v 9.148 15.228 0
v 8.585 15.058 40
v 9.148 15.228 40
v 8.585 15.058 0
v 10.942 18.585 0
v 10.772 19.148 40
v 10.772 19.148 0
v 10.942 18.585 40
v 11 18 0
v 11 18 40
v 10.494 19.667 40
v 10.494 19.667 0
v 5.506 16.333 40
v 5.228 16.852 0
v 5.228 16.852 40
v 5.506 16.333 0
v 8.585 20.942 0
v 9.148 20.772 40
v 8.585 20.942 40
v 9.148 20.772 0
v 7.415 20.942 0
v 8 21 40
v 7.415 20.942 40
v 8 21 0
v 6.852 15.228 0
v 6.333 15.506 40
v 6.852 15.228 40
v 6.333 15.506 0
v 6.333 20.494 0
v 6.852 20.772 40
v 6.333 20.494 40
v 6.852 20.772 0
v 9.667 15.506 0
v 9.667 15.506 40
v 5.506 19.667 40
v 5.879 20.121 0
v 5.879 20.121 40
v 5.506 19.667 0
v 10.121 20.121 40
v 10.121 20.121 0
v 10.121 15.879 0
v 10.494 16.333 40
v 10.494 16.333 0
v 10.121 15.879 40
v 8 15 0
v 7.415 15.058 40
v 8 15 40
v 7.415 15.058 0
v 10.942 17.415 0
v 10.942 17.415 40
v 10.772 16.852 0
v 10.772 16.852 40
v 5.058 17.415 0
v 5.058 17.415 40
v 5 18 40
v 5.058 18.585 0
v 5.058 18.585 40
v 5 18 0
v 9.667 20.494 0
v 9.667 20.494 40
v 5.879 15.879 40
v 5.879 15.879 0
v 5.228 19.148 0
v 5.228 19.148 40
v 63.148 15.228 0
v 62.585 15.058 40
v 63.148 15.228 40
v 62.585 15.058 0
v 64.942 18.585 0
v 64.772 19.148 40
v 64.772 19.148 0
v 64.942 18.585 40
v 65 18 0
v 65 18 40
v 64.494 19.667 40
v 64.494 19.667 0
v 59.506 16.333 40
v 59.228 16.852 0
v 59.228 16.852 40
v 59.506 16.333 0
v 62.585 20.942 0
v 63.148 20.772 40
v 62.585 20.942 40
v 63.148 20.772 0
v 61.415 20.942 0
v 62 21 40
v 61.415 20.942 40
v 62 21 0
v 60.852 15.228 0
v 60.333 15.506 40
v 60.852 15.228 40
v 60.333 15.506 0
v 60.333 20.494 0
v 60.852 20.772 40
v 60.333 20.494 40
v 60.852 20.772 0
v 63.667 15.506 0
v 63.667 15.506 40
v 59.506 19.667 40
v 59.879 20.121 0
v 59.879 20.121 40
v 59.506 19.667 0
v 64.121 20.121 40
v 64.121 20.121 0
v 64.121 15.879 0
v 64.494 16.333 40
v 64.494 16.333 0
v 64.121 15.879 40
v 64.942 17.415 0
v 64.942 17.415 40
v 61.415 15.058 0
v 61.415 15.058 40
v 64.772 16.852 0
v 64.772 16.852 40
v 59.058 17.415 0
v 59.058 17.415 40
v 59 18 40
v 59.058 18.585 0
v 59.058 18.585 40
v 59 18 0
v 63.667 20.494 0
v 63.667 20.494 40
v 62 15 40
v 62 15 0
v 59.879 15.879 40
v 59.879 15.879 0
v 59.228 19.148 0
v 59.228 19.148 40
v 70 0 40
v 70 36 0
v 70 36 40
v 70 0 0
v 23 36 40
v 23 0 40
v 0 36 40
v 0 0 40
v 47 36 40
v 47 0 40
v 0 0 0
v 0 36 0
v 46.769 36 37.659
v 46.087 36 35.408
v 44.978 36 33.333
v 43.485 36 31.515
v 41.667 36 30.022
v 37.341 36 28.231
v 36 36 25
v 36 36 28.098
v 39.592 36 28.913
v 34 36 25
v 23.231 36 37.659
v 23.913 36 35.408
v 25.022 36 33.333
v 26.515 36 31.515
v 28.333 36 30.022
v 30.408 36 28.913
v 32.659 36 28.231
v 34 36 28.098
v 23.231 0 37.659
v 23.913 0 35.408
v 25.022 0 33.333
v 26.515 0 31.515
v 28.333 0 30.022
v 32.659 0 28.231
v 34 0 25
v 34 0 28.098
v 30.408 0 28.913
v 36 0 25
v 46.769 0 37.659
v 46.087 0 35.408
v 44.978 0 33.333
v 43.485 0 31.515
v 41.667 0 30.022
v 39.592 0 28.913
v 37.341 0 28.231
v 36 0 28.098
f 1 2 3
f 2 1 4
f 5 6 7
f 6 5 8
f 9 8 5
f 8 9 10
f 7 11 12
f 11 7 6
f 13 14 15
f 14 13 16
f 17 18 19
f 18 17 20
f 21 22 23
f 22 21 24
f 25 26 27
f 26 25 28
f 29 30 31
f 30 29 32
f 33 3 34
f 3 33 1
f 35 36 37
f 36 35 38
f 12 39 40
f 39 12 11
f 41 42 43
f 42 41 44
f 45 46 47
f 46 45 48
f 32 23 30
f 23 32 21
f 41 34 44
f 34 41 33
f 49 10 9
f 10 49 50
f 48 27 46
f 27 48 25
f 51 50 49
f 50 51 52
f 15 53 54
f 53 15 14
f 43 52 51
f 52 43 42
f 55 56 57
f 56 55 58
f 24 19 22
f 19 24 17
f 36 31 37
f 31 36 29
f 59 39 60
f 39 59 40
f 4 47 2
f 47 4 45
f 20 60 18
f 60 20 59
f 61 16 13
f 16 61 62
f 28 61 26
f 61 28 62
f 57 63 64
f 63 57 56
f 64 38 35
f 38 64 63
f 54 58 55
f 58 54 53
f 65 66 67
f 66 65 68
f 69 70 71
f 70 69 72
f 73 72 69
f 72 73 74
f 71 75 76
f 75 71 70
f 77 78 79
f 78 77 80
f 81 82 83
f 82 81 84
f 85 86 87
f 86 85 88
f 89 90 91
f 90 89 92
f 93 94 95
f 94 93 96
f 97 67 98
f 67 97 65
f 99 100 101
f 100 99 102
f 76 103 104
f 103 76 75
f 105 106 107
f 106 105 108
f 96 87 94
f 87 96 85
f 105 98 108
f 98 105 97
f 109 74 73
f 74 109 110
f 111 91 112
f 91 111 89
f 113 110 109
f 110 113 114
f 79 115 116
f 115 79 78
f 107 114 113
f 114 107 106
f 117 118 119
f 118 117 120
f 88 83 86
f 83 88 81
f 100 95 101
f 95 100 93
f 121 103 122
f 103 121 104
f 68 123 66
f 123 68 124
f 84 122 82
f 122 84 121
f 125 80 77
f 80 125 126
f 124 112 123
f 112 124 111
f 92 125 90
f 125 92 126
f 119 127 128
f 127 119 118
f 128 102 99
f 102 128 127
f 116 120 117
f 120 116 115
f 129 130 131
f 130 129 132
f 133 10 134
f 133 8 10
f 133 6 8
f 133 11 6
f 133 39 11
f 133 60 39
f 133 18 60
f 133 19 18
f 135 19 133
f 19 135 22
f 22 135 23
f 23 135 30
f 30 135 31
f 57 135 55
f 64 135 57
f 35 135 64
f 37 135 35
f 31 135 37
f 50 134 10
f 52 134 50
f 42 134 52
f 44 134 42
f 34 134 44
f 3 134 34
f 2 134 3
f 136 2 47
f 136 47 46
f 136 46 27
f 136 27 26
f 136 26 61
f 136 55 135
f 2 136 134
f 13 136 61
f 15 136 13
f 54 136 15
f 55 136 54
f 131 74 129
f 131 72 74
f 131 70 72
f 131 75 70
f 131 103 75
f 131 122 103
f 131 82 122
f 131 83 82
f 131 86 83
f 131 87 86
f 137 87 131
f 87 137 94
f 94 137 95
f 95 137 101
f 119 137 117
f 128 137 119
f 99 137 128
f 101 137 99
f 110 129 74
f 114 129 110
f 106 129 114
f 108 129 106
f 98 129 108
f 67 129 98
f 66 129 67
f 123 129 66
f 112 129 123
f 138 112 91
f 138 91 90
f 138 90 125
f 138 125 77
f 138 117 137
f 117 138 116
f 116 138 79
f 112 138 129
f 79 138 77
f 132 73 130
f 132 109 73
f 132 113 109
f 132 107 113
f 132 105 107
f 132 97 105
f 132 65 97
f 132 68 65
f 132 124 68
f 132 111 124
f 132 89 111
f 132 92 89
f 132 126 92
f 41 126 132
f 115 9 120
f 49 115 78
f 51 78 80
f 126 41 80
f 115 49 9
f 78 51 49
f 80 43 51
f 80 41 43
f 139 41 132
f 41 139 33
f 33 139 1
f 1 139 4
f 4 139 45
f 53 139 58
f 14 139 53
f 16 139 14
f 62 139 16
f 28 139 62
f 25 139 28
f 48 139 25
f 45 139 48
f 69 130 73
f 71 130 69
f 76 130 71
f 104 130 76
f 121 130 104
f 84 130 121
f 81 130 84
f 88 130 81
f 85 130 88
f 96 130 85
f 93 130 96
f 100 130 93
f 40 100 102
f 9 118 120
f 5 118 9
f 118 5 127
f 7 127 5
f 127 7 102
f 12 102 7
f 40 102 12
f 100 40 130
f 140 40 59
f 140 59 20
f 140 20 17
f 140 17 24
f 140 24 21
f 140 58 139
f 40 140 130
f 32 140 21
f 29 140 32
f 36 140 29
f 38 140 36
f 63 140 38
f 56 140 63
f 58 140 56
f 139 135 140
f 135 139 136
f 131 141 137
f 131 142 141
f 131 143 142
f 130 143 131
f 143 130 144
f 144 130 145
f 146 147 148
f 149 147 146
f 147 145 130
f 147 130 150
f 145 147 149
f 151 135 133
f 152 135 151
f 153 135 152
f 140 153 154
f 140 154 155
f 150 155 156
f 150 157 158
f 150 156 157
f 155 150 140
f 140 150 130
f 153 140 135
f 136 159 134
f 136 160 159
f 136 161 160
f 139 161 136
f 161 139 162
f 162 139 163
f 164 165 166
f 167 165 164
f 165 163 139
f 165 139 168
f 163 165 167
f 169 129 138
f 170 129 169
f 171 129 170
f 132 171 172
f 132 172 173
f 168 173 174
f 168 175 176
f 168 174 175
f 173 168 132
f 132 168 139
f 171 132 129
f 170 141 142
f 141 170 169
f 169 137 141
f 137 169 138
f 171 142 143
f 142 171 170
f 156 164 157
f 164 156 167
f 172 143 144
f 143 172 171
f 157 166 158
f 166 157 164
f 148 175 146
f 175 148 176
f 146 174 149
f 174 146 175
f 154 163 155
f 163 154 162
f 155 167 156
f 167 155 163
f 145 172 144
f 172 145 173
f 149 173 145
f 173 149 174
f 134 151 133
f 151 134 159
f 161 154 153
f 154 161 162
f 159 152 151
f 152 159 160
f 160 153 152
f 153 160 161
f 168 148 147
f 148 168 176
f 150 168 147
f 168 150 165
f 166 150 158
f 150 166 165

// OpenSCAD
$fn = 32;

// ----------------------------------------------------------------------
// Saddle clamp: split shaft clamp
// ----------------------------------------------------------------------

// --- parameters (mm) ---
blk_l = 70;               // block length, X
blk_w = 36;               // block width, Y
blk_h = 40;               // block height
clamp_r = 12;             // shaft groove radius
hole_r = 3;               // bolt hole radius
hole_m = 8;               // bolt hole margin from the ends
saw_w = 2;                // saw kerf width
fit_tol = 0.1;            // tolerance for press fits, mm
free_tol = 0.3;           // tolerance for clearance fits, mm

saw_depth = clamp_r + 3;  // saw kerf depth

difference() {
  cube([blk_l, blk_w, blk_h]);
  translate([blk_l / 2, -1, blk_h])
    rotate([-90, 0, 0])
      cylinder(h = blk_w + 2, r = clamp_r);
  for (sx = [0, 1])
    translate([sx ? blk_l - hole_m : hole_m, blk_w / 2, -1])
      cylinder(r = hole_r, h = blk_h + 2);
  translate([blk_l / 2 - saw_w / 2, -1, blk_h - saw_depth])
    cube([saw_w, blk_w + 2, saw_depth + 1]);
}
